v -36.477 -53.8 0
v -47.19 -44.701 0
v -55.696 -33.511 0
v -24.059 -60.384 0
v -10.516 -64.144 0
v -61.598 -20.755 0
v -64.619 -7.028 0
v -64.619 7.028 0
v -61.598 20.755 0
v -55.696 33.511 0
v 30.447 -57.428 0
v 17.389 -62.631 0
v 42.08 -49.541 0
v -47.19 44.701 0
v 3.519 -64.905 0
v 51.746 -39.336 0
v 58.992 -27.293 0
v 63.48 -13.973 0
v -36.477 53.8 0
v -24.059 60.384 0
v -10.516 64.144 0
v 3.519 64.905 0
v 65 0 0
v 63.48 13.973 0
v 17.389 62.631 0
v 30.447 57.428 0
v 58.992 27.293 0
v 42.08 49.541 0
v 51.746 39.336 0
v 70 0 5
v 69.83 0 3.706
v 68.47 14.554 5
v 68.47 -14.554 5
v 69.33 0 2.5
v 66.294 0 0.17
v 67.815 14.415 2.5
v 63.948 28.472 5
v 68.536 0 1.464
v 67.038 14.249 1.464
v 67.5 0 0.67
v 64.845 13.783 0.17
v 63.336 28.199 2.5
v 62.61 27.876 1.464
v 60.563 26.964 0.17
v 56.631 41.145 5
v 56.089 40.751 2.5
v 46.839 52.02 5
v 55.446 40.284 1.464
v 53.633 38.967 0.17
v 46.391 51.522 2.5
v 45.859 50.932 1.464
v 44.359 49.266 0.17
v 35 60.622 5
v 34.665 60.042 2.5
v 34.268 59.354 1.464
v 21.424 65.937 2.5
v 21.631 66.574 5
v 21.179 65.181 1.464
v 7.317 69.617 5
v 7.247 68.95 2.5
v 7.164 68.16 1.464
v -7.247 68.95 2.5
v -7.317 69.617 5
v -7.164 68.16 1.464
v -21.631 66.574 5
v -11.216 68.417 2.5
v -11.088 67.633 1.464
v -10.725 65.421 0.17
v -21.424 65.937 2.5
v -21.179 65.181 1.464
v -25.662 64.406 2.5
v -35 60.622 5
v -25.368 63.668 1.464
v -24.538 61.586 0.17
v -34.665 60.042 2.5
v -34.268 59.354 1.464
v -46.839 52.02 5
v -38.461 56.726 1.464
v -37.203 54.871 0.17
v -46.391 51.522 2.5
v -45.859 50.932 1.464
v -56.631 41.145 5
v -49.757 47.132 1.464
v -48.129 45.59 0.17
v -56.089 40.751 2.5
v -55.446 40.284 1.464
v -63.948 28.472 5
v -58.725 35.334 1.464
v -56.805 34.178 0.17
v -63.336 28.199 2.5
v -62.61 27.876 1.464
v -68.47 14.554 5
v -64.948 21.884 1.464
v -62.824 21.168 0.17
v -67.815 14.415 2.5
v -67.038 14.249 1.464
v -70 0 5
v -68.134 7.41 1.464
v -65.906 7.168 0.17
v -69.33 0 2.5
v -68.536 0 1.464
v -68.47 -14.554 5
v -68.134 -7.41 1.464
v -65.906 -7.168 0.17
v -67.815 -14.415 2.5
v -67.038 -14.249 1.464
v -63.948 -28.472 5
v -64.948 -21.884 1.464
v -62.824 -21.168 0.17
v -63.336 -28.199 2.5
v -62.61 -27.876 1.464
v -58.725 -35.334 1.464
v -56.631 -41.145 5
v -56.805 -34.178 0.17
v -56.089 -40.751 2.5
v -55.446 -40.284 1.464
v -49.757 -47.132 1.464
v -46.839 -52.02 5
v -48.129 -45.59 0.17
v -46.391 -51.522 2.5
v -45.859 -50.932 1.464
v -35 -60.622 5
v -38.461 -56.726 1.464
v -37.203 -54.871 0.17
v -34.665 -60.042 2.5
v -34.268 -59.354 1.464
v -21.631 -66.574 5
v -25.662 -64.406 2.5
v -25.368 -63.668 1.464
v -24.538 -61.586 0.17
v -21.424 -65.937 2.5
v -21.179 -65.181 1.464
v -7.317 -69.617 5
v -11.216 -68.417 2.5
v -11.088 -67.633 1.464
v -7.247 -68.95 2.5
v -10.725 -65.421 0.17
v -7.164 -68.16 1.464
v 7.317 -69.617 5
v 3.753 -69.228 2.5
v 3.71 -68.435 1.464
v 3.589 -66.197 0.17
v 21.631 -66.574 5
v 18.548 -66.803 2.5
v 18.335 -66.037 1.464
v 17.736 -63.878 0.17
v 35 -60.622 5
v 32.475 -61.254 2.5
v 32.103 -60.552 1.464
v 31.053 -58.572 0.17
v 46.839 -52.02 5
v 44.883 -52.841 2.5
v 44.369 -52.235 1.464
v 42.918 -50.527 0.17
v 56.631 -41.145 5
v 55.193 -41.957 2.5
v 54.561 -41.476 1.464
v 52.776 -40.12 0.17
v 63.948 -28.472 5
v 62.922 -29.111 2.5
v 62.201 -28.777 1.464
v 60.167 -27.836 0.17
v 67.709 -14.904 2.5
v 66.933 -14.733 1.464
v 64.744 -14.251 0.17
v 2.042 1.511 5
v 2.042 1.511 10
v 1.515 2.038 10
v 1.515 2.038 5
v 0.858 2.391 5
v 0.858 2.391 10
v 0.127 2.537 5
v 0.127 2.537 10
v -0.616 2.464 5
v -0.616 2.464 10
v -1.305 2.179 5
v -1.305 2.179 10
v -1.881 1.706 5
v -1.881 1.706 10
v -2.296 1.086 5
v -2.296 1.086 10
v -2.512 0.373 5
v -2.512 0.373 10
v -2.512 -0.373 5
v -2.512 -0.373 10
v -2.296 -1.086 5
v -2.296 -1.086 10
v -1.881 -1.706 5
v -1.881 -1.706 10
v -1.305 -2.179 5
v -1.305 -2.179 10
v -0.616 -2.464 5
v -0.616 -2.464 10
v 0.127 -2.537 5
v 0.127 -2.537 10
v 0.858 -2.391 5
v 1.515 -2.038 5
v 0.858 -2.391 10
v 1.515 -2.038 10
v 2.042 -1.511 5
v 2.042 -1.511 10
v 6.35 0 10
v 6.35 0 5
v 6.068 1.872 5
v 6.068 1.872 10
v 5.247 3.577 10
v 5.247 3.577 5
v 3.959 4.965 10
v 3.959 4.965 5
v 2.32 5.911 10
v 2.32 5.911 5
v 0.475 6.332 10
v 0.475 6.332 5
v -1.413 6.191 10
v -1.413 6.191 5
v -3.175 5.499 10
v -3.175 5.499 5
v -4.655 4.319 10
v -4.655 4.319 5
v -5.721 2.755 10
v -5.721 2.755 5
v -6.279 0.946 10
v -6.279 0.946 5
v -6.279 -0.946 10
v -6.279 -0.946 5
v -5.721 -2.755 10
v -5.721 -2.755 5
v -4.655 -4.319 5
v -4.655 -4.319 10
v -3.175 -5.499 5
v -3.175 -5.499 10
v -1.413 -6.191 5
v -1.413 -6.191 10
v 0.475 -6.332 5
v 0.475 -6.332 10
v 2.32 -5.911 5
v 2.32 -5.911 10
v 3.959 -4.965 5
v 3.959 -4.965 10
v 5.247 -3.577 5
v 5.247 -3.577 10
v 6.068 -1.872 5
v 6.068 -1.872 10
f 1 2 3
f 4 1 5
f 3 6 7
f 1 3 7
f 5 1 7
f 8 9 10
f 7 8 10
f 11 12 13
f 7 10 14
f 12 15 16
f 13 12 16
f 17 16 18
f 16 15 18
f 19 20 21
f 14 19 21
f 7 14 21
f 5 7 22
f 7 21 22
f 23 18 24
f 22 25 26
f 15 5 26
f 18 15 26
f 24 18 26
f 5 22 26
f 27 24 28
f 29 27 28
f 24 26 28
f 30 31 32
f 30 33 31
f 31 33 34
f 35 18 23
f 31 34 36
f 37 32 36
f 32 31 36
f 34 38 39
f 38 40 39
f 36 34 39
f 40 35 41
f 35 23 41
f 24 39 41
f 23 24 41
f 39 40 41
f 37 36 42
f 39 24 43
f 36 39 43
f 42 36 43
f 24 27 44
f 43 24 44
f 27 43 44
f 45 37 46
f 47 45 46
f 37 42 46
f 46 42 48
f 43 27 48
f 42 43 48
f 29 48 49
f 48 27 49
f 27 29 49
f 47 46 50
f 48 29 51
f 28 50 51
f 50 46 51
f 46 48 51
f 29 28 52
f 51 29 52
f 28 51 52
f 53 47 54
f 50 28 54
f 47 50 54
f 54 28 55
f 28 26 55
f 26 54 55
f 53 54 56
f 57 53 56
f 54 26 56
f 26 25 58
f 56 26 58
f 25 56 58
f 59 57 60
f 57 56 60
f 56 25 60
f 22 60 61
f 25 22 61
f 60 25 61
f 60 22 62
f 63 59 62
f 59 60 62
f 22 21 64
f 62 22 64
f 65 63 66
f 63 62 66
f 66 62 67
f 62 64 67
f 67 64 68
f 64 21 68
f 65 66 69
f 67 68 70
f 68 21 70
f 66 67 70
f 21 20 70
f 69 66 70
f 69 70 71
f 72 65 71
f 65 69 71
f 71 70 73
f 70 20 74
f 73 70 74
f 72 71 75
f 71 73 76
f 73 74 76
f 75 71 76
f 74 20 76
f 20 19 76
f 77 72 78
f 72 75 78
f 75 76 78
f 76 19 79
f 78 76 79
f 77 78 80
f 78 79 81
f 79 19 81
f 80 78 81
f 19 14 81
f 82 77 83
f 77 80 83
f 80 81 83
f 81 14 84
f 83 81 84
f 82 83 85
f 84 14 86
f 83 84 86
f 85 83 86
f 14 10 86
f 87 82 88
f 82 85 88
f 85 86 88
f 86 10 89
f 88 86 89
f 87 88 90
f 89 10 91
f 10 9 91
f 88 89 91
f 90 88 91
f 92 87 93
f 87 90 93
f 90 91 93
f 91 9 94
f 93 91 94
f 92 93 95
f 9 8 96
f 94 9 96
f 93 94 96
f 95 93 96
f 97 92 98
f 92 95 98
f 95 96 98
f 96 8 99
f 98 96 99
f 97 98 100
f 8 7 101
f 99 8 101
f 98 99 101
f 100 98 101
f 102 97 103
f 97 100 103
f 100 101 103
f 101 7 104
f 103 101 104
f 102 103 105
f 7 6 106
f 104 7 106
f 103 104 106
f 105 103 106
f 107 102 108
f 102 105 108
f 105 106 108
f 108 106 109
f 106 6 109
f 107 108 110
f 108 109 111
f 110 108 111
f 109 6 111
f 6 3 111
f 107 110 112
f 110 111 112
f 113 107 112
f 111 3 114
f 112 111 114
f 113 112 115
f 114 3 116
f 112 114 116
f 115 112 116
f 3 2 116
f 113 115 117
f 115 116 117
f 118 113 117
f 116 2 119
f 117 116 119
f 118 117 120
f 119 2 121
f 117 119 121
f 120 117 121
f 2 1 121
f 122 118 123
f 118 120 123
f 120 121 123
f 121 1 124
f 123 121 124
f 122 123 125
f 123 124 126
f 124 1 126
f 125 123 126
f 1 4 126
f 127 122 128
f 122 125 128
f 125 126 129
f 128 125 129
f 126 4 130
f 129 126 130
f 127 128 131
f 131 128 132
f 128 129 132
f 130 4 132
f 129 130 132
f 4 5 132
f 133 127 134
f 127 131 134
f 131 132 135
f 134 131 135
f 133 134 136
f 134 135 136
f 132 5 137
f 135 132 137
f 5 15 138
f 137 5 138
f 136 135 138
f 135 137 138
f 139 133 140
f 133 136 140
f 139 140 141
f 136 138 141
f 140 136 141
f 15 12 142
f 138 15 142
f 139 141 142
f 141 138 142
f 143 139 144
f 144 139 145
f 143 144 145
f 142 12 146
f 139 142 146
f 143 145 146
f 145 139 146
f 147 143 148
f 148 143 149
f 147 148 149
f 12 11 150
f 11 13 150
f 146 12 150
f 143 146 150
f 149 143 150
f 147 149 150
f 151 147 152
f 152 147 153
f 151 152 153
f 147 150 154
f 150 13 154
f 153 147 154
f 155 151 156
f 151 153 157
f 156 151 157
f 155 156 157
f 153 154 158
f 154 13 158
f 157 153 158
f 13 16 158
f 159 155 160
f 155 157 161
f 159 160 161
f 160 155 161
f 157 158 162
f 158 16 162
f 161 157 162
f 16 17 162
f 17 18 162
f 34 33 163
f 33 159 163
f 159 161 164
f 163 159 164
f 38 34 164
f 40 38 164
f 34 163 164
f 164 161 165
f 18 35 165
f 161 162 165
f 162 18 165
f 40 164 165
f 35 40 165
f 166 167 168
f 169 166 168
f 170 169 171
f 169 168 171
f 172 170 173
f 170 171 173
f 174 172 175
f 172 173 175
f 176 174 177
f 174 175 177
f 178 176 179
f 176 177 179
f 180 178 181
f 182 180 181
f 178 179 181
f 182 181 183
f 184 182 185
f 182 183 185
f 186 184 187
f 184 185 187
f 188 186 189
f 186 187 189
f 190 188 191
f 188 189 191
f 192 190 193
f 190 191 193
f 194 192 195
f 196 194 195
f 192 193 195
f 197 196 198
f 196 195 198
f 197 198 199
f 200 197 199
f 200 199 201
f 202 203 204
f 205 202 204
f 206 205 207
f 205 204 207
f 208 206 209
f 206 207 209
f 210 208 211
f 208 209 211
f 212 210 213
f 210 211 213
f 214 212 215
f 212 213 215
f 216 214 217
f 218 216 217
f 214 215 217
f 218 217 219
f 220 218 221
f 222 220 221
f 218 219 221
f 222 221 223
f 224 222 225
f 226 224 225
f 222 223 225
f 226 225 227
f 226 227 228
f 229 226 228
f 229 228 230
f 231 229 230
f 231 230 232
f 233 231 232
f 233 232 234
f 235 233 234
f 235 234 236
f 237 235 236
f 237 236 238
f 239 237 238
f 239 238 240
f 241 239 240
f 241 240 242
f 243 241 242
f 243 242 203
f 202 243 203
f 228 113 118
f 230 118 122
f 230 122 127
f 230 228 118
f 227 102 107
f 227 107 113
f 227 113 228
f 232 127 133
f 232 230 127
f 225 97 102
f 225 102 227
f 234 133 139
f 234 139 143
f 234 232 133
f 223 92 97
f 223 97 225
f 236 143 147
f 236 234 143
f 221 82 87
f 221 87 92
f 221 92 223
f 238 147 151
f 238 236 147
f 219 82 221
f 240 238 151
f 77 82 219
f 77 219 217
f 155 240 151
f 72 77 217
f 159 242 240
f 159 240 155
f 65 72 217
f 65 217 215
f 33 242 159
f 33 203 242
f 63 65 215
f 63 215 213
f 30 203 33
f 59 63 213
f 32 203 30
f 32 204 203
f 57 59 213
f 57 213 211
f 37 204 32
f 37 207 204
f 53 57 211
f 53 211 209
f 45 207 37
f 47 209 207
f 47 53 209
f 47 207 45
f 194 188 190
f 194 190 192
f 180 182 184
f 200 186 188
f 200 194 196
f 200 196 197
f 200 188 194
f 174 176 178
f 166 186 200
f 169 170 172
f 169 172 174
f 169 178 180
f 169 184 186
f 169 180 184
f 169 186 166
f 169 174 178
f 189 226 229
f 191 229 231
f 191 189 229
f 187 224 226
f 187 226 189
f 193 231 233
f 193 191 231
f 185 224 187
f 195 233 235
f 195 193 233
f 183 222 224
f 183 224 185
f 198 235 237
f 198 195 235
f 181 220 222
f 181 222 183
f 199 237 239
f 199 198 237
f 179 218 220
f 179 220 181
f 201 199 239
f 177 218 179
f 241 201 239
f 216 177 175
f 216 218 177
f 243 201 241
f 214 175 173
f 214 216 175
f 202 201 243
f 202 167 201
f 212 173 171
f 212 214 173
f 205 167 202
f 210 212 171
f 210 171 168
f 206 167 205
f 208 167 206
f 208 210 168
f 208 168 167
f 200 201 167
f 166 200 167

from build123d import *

# Parameters (mm, degrees)
SKETCH3_R           = 6.35
BOSS_EXTRUDE2_DEPTH = 10
CUT_EXTRUDE2_DEPTH  = 10
SKETCH5_R           = 70
BOSS_EXTRUDE3_DEPTH = 5
FILLET1_R           = 5


with BuildPart() as part:
    # Sketch3 → Boss-Extrude2 (new body)
    with BuildSketch(Plane.XY):
        Circle(SKETCH3_R)
    extrude(amount=BOSS_EXTRUDE2_DEPTH)

    # Sketch4 → Cut-Extrude2 (cut)
    with BuildSketch(Plane.XY.offset(10)):
        with BuildLine():
            Line((2.042025903, -1.510539709), (2.042025903, 1.510539709))
            ThreePointArc((2.042025903, 1.510539709), (-2.54, 0), (2.042025903, -1.510539709))
        make_face()
    extrude(amount=-CUT_EXTRUDE2_DEPTH, mode=Mode.SUBTRACT)

    # Sketch5 → Boss-Extrude3 (add)
    with BuildSketch(Plane.XY):
        Circle(SKETCH5_R)
    extrude(amount=BOSS_EXTRUDE3_DEPTH)

    # Fillet1
    fillet1_edges = [part.edges().sort_by_distance(p)[0] for p in [
        (-70, 0, 0),
    ]]
    fillet(fillet1_edges, radius=FILLET1_R - 0.0001)  # a hair under: the kernel refuses the full size


solid = part.part
